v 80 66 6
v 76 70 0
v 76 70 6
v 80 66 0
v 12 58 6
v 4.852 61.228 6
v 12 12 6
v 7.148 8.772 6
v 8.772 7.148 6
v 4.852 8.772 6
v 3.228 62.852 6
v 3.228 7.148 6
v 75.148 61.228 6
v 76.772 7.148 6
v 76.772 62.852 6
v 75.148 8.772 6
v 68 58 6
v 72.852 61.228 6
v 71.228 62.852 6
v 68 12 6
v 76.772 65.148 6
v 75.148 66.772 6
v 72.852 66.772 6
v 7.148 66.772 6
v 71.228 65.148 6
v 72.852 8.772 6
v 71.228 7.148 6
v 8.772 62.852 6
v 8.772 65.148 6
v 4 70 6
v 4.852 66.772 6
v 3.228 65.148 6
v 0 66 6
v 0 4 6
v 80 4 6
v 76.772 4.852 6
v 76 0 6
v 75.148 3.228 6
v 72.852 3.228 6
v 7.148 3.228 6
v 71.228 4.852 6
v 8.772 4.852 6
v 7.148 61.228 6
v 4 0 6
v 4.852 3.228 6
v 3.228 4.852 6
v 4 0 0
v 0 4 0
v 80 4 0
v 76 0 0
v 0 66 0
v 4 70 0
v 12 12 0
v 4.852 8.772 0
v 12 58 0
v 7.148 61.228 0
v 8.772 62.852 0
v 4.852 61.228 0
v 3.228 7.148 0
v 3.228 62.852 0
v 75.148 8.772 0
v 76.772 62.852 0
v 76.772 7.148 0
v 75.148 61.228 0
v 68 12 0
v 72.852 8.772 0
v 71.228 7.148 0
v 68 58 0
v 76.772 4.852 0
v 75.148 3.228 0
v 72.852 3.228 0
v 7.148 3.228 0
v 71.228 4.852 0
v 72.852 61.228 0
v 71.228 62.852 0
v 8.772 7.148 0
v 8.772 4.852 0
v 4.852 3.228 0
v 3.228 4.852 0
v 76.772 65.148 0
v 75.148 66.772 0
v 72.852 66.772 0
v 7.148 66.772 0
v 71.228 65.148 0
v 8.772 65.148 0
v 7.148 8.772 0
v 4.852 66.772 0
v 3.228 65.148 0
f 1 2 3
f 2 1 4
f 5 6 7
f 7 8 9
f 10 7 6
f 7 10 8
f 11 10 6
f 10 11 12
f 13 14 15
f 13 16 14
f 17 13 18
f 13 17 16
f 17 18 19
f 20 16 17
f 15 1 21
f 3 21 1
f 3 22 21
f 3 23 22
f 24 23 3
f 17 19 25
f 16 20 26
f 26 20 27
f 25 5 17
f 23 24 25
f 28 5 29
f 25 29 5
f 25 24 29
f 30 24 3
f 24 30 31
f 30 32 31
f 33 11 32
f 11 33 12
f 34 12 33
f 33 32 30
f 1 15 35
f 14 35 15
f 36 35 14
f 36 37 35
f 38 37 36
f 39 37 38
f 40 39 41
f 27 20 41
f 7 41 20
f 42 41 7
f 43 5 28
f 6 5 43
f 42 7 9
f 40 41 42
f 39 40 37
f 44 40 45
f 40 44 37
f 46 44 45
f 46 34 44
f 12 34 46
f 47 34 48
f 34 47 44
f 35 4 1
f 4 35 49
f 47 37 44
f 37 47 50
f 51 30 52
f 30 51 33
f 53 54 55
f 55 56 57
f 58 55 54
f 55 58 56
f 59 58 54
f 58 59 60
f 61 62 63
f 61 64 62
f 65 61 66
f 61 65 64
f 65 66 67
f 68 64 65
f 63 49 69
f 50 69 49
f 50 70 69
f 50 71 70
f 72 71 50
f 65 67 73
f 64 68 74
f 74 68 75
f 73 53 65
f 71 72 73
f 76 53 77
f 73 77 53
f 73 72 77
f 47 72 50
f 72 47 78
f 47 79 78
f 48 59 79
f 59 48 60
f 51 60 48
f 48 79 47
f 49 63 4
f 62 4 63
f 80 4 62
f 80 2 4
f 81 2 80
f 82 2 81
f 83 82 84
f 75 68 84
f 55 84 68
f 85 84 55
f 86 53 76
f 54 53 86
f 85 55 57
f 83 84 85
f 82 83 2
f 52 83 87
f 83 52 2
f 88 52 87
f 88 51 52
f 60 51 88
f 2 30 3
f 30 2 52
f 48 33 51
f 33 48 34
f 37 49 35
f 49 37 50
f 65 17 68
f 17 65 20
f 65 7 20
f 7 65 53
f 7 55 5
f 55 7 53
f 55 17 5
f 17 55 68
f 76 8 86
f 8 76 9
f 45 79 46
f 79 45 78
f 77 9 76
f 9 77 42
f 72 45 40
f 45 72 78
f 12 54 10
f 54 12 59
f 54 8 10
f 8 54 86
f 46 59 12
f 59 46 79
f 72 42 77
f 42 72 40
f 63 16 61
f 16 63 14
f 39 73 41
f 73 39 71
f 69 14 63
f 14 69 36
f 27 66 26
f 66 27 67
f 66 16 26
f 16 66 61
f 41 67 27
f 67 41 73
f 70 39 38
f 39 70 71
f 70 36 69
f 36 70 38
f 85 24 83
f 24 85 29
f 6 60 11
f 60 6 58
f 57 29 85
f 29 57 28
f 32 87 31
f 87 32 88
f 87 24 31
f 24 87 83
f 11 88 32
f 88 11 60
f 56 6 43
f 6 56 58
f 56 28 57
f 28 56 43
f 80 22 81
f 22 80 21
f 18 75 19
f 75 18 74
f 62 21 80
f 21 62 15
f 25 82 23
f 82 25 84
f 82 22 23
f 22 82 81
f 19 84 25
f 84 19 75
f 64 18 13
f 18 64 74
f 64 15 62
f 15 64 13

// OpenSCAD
$fn = 32;

// ----------------------------------------------------------------------
// Frame plate: 80 x 70 frame, 12 mm rails
// ----------------------------------------------------------------------

// --- parameters (mm) ---
plate_l = 80;             // plate length, X
plate_w = 70;             // plate width, Y
plate_t = 6;              // plate thickness, Z (extrusion height)
corner_c = 4;             // corner chamfer
frame_bar = 12;           // frame rail width
bolt_r = 3;               // corner bolt window radius
bolt_inset = 6;           // bolt centre inset from the edges

win_l = plate_l - 2 * frame_bar;  // window length
win_w = plate_w - 2 * frame_bar;  // window width
bolt_d = 2 * bolt_r;  // corner hole diameter

profile = [[4, 0], [76, 0], [80, 4], [80, 66], [76, 70], [4, 70], [0, 66], [0, 4]];  // primary outline, 8 points, counter clockwise
void_1 = [[12, 12], [68, 12], [68, 58], [12, 58]];  // the window, 4 points
void_2 = [[8.772, 7.148], [7.148, 8.772], [4.852, 8.772], [3.228, 7.148], [3.228, 4.852], [4.852, 3.228], [7.148, 3.228], [8.772, 4.852]];  // corner bolt window, 8 points
void_3 = [[76.772, 7.148], [75.148, 8.772], [72.852, 8.772], [71.228, 7.148], [71.228, 4.852], [72.852, 3.228], [75.148, 3.228], [76.772, 4.852]];  // corner bolt window, 8 points
void_4 = [[8.772, 65.148], [7.148, 66.772], [4.852, 66.772], [3.228, 65.148], [3.228, 62.852], [4.852, 61.228], [7.148, 61.228], [8.772, 62.852]];  // corner bolt window, 8 points
void_5 = [[76.772, 65.148], [75.148, 66.772], [72.852, 66.772], [71.228, 65.148], [71.228, 62.852], [72.852, 61.228], [75.148, 61.228], [76.772, 62.852]];  // corner bolt window, 8 points

// --- the one profile operation ---
difference() {
  linear_extrude(height = plate_t) polygon(points = profile);
  translate([0, 0, -1])
    linear_extrude(height = plate_t + 2) polygon(points = void_1);
  translate([0, 0, -1])
    linear_extrude(height = plate_t + 2) polygon(points = void_2);
  translate([0, 0, -1])
    linear_extrude(height = plate_t + 2) polygon(points = void_3);
  translate([0, 0, -1])
    linear_extrude(height = plate_t + 2) polygon(points = void_4);
  translate([0, 0, -1])
    linear_extrude(height = plate_t + 2) polygon(points = void_5);
}
